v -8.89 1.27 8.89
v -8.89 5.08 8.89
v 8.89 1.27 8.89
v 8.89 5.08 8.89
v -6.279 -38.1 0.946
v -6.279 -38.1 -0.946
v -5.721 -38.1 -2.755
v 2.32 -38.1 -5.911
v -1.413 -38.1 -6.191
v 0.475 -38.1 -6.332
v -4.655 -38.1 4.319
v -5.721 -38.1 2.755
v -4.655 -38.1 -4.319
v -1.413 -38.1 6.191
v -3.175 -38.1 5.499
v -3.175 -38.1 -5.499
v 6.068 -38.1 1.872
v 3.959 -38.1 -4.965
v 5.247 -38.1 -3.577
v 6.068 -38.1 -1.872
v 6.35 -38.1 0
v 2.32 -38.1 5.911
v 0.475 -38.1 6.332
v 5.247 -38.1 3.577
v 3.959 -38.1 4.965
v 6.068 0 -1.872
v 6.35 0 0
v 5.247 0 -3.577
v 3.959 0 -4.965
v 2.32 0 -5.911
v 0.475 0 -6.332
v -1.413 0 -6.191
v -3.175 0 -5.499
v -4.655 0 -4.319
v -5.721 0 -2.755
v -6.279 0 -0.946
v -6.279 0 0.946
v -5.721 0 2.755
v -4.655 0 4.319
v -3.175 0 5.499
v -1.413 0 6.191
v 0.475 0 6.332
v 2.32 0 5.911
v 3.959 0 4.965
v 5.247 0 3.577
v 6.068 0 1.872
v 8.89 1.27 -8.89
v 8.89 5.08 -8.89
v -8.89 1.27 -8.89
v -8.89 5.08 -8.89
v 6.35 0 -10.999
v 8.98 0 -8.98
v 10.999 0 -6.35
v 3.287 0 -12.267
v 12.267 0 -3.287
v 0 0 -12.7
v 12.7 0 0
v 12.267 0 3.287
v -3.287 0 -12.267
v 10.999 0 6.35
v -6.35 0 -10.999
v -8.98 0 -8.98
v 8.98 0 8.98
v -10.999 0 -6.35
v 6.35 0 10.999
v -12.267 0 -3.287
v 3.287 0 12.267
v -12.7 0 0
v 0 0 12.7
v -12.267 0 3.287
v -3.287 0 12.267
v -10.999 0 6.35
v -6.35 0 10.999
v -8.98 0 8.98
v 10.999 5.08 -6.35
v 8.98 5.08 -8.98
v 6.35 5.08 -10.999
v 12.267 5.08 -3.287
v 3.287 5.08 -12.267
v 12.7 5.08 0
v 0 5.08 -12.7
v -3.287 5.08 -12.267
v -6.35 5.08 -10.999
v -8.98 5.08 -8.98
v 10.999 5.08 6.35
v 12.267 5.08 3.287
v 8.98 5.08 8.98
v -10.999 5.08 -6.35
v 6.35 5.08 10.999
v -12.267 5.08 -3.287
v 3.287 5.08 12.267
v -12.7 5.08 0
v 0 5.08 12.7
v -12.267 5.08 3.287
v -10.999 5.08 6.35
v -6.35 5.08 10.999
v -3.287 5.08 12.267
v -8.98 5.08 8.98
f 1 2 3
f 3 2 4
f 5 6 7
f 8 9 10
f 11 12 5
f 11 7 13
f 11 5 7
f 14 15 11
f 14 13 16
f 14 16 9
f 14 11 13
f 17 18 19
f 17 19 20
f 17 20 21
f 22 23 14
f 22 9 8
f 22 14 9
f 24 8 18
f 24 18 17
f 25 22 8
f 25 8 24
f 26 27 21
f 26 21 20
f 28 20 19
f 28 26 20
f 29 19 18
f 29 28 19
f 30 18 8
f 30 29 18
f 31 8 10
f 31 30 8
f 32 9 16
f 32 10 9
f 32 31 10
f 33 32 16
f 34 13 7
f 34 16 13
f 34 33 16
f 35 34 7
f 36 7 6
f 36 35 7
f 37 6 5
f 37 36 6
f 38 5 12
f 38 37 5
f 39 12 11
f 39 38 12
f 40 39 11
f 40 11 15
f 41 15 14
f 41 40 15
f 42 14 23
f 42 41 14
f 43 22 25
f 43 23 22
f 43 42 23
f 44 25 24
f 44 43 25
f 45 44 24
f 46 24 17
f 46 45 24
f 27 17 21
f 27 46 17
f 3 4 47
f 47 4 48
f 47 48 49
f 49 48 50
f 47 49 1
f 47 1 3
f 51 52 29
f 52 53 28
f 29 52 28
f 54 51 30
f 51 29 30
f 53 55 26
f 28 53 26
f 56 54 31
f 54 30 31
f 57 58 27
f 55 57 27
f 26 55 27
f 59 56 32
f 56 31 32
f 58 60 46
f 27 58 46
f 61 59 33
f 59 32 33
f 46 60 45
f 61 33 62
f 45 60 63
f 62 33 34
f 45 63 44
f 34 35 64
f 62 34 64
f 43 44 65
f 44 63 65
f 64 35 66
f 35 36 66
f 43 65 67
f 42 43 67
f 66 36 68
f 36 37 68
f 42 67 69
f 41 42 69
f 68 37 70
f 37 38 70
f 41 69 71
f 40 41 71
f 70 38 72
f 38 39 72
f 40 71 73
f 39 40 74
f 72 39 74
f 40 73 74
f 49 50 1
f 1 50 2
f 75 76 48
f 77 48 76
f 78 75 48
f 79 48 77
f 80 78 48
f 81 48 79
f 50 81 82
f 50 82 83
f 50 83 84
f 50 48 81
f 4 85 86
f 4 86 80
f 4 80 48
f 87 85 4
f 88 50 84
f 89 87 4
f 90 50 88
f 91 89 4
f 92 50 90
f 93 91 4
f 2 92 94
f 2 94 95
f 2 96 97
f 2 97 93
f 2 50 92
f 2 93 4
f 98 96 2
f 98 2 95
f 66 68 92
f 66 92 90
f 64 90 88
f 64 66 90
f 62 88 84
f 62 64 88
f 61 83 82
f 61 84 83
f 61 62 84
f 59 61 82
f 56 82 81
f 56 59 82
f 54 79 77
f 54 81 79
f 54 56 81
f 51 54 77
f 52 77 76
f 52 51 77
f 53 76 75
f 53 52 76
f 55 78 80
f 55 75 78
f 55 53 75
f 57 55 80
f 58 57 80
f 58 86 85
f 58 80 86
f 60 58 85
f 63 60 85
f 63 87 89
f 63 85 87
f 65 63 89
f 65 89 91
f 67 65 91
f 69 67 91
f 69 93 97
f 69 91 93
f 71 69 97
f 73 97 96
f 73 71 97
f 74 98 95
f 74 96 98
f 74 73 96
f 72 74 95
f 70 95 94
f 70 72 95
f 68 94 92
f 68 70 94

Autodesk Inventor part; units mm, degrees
ref_plane "YZ Plane" through (0, 0, 0) normal (1, 0, 0) x (0, 1, 0)
ref_plane "XZ Plane" through (0, 0, 0) normal (0, 1, 0) x (-1, 0, 0)
ref_plane "XY Plane" through (0, 0, 0) normal (0, 0, 1) x (1, 0, 0)
sketch "Sketch1" plane through (0, 0, 0) normal (0, 1, 0) x (-1, 0, 0)
  circle A0 centre (0, 0) radius 12.7
  dimension "d0" = 25.4
extrude "Extrusion1" add sketch "Sketch1" along normal blind 5.08
sketch "Sketch2" plane through (0, 5.08, 0) normal (0, 1, 0) x (1, 0, 0)
  line L0 (-8.89, -8.89) -> (8.89, -8.89)
  line L1 (8.89, -8.89) -> (8.89, 8.89)
  line L2 (8.89, 8.89) -> (-8.89, 8.89)
  line L3 (-8.89, 8.89) -> (-8.89, -8.89)
  point P0 (0, 0)
extrude "Extrusion2" cut sketch "Sketch2" against normal blind 3.81
sketch "Sketch3" plane through (0, 0, 0) normal (0, -1, 0) x (1, 0, 0)
  circle A0 centre (0, 0) radius 6.35
  dimension "d9" = 12.7
extrude "Extrusion3" add sketch "Sketch3" along normal blind 38.1
thread "Thread1" size "1/2-13 UNC" class "2A" standard "ANSI Unified Screw Threads" full length
properties part number "Bolt"
